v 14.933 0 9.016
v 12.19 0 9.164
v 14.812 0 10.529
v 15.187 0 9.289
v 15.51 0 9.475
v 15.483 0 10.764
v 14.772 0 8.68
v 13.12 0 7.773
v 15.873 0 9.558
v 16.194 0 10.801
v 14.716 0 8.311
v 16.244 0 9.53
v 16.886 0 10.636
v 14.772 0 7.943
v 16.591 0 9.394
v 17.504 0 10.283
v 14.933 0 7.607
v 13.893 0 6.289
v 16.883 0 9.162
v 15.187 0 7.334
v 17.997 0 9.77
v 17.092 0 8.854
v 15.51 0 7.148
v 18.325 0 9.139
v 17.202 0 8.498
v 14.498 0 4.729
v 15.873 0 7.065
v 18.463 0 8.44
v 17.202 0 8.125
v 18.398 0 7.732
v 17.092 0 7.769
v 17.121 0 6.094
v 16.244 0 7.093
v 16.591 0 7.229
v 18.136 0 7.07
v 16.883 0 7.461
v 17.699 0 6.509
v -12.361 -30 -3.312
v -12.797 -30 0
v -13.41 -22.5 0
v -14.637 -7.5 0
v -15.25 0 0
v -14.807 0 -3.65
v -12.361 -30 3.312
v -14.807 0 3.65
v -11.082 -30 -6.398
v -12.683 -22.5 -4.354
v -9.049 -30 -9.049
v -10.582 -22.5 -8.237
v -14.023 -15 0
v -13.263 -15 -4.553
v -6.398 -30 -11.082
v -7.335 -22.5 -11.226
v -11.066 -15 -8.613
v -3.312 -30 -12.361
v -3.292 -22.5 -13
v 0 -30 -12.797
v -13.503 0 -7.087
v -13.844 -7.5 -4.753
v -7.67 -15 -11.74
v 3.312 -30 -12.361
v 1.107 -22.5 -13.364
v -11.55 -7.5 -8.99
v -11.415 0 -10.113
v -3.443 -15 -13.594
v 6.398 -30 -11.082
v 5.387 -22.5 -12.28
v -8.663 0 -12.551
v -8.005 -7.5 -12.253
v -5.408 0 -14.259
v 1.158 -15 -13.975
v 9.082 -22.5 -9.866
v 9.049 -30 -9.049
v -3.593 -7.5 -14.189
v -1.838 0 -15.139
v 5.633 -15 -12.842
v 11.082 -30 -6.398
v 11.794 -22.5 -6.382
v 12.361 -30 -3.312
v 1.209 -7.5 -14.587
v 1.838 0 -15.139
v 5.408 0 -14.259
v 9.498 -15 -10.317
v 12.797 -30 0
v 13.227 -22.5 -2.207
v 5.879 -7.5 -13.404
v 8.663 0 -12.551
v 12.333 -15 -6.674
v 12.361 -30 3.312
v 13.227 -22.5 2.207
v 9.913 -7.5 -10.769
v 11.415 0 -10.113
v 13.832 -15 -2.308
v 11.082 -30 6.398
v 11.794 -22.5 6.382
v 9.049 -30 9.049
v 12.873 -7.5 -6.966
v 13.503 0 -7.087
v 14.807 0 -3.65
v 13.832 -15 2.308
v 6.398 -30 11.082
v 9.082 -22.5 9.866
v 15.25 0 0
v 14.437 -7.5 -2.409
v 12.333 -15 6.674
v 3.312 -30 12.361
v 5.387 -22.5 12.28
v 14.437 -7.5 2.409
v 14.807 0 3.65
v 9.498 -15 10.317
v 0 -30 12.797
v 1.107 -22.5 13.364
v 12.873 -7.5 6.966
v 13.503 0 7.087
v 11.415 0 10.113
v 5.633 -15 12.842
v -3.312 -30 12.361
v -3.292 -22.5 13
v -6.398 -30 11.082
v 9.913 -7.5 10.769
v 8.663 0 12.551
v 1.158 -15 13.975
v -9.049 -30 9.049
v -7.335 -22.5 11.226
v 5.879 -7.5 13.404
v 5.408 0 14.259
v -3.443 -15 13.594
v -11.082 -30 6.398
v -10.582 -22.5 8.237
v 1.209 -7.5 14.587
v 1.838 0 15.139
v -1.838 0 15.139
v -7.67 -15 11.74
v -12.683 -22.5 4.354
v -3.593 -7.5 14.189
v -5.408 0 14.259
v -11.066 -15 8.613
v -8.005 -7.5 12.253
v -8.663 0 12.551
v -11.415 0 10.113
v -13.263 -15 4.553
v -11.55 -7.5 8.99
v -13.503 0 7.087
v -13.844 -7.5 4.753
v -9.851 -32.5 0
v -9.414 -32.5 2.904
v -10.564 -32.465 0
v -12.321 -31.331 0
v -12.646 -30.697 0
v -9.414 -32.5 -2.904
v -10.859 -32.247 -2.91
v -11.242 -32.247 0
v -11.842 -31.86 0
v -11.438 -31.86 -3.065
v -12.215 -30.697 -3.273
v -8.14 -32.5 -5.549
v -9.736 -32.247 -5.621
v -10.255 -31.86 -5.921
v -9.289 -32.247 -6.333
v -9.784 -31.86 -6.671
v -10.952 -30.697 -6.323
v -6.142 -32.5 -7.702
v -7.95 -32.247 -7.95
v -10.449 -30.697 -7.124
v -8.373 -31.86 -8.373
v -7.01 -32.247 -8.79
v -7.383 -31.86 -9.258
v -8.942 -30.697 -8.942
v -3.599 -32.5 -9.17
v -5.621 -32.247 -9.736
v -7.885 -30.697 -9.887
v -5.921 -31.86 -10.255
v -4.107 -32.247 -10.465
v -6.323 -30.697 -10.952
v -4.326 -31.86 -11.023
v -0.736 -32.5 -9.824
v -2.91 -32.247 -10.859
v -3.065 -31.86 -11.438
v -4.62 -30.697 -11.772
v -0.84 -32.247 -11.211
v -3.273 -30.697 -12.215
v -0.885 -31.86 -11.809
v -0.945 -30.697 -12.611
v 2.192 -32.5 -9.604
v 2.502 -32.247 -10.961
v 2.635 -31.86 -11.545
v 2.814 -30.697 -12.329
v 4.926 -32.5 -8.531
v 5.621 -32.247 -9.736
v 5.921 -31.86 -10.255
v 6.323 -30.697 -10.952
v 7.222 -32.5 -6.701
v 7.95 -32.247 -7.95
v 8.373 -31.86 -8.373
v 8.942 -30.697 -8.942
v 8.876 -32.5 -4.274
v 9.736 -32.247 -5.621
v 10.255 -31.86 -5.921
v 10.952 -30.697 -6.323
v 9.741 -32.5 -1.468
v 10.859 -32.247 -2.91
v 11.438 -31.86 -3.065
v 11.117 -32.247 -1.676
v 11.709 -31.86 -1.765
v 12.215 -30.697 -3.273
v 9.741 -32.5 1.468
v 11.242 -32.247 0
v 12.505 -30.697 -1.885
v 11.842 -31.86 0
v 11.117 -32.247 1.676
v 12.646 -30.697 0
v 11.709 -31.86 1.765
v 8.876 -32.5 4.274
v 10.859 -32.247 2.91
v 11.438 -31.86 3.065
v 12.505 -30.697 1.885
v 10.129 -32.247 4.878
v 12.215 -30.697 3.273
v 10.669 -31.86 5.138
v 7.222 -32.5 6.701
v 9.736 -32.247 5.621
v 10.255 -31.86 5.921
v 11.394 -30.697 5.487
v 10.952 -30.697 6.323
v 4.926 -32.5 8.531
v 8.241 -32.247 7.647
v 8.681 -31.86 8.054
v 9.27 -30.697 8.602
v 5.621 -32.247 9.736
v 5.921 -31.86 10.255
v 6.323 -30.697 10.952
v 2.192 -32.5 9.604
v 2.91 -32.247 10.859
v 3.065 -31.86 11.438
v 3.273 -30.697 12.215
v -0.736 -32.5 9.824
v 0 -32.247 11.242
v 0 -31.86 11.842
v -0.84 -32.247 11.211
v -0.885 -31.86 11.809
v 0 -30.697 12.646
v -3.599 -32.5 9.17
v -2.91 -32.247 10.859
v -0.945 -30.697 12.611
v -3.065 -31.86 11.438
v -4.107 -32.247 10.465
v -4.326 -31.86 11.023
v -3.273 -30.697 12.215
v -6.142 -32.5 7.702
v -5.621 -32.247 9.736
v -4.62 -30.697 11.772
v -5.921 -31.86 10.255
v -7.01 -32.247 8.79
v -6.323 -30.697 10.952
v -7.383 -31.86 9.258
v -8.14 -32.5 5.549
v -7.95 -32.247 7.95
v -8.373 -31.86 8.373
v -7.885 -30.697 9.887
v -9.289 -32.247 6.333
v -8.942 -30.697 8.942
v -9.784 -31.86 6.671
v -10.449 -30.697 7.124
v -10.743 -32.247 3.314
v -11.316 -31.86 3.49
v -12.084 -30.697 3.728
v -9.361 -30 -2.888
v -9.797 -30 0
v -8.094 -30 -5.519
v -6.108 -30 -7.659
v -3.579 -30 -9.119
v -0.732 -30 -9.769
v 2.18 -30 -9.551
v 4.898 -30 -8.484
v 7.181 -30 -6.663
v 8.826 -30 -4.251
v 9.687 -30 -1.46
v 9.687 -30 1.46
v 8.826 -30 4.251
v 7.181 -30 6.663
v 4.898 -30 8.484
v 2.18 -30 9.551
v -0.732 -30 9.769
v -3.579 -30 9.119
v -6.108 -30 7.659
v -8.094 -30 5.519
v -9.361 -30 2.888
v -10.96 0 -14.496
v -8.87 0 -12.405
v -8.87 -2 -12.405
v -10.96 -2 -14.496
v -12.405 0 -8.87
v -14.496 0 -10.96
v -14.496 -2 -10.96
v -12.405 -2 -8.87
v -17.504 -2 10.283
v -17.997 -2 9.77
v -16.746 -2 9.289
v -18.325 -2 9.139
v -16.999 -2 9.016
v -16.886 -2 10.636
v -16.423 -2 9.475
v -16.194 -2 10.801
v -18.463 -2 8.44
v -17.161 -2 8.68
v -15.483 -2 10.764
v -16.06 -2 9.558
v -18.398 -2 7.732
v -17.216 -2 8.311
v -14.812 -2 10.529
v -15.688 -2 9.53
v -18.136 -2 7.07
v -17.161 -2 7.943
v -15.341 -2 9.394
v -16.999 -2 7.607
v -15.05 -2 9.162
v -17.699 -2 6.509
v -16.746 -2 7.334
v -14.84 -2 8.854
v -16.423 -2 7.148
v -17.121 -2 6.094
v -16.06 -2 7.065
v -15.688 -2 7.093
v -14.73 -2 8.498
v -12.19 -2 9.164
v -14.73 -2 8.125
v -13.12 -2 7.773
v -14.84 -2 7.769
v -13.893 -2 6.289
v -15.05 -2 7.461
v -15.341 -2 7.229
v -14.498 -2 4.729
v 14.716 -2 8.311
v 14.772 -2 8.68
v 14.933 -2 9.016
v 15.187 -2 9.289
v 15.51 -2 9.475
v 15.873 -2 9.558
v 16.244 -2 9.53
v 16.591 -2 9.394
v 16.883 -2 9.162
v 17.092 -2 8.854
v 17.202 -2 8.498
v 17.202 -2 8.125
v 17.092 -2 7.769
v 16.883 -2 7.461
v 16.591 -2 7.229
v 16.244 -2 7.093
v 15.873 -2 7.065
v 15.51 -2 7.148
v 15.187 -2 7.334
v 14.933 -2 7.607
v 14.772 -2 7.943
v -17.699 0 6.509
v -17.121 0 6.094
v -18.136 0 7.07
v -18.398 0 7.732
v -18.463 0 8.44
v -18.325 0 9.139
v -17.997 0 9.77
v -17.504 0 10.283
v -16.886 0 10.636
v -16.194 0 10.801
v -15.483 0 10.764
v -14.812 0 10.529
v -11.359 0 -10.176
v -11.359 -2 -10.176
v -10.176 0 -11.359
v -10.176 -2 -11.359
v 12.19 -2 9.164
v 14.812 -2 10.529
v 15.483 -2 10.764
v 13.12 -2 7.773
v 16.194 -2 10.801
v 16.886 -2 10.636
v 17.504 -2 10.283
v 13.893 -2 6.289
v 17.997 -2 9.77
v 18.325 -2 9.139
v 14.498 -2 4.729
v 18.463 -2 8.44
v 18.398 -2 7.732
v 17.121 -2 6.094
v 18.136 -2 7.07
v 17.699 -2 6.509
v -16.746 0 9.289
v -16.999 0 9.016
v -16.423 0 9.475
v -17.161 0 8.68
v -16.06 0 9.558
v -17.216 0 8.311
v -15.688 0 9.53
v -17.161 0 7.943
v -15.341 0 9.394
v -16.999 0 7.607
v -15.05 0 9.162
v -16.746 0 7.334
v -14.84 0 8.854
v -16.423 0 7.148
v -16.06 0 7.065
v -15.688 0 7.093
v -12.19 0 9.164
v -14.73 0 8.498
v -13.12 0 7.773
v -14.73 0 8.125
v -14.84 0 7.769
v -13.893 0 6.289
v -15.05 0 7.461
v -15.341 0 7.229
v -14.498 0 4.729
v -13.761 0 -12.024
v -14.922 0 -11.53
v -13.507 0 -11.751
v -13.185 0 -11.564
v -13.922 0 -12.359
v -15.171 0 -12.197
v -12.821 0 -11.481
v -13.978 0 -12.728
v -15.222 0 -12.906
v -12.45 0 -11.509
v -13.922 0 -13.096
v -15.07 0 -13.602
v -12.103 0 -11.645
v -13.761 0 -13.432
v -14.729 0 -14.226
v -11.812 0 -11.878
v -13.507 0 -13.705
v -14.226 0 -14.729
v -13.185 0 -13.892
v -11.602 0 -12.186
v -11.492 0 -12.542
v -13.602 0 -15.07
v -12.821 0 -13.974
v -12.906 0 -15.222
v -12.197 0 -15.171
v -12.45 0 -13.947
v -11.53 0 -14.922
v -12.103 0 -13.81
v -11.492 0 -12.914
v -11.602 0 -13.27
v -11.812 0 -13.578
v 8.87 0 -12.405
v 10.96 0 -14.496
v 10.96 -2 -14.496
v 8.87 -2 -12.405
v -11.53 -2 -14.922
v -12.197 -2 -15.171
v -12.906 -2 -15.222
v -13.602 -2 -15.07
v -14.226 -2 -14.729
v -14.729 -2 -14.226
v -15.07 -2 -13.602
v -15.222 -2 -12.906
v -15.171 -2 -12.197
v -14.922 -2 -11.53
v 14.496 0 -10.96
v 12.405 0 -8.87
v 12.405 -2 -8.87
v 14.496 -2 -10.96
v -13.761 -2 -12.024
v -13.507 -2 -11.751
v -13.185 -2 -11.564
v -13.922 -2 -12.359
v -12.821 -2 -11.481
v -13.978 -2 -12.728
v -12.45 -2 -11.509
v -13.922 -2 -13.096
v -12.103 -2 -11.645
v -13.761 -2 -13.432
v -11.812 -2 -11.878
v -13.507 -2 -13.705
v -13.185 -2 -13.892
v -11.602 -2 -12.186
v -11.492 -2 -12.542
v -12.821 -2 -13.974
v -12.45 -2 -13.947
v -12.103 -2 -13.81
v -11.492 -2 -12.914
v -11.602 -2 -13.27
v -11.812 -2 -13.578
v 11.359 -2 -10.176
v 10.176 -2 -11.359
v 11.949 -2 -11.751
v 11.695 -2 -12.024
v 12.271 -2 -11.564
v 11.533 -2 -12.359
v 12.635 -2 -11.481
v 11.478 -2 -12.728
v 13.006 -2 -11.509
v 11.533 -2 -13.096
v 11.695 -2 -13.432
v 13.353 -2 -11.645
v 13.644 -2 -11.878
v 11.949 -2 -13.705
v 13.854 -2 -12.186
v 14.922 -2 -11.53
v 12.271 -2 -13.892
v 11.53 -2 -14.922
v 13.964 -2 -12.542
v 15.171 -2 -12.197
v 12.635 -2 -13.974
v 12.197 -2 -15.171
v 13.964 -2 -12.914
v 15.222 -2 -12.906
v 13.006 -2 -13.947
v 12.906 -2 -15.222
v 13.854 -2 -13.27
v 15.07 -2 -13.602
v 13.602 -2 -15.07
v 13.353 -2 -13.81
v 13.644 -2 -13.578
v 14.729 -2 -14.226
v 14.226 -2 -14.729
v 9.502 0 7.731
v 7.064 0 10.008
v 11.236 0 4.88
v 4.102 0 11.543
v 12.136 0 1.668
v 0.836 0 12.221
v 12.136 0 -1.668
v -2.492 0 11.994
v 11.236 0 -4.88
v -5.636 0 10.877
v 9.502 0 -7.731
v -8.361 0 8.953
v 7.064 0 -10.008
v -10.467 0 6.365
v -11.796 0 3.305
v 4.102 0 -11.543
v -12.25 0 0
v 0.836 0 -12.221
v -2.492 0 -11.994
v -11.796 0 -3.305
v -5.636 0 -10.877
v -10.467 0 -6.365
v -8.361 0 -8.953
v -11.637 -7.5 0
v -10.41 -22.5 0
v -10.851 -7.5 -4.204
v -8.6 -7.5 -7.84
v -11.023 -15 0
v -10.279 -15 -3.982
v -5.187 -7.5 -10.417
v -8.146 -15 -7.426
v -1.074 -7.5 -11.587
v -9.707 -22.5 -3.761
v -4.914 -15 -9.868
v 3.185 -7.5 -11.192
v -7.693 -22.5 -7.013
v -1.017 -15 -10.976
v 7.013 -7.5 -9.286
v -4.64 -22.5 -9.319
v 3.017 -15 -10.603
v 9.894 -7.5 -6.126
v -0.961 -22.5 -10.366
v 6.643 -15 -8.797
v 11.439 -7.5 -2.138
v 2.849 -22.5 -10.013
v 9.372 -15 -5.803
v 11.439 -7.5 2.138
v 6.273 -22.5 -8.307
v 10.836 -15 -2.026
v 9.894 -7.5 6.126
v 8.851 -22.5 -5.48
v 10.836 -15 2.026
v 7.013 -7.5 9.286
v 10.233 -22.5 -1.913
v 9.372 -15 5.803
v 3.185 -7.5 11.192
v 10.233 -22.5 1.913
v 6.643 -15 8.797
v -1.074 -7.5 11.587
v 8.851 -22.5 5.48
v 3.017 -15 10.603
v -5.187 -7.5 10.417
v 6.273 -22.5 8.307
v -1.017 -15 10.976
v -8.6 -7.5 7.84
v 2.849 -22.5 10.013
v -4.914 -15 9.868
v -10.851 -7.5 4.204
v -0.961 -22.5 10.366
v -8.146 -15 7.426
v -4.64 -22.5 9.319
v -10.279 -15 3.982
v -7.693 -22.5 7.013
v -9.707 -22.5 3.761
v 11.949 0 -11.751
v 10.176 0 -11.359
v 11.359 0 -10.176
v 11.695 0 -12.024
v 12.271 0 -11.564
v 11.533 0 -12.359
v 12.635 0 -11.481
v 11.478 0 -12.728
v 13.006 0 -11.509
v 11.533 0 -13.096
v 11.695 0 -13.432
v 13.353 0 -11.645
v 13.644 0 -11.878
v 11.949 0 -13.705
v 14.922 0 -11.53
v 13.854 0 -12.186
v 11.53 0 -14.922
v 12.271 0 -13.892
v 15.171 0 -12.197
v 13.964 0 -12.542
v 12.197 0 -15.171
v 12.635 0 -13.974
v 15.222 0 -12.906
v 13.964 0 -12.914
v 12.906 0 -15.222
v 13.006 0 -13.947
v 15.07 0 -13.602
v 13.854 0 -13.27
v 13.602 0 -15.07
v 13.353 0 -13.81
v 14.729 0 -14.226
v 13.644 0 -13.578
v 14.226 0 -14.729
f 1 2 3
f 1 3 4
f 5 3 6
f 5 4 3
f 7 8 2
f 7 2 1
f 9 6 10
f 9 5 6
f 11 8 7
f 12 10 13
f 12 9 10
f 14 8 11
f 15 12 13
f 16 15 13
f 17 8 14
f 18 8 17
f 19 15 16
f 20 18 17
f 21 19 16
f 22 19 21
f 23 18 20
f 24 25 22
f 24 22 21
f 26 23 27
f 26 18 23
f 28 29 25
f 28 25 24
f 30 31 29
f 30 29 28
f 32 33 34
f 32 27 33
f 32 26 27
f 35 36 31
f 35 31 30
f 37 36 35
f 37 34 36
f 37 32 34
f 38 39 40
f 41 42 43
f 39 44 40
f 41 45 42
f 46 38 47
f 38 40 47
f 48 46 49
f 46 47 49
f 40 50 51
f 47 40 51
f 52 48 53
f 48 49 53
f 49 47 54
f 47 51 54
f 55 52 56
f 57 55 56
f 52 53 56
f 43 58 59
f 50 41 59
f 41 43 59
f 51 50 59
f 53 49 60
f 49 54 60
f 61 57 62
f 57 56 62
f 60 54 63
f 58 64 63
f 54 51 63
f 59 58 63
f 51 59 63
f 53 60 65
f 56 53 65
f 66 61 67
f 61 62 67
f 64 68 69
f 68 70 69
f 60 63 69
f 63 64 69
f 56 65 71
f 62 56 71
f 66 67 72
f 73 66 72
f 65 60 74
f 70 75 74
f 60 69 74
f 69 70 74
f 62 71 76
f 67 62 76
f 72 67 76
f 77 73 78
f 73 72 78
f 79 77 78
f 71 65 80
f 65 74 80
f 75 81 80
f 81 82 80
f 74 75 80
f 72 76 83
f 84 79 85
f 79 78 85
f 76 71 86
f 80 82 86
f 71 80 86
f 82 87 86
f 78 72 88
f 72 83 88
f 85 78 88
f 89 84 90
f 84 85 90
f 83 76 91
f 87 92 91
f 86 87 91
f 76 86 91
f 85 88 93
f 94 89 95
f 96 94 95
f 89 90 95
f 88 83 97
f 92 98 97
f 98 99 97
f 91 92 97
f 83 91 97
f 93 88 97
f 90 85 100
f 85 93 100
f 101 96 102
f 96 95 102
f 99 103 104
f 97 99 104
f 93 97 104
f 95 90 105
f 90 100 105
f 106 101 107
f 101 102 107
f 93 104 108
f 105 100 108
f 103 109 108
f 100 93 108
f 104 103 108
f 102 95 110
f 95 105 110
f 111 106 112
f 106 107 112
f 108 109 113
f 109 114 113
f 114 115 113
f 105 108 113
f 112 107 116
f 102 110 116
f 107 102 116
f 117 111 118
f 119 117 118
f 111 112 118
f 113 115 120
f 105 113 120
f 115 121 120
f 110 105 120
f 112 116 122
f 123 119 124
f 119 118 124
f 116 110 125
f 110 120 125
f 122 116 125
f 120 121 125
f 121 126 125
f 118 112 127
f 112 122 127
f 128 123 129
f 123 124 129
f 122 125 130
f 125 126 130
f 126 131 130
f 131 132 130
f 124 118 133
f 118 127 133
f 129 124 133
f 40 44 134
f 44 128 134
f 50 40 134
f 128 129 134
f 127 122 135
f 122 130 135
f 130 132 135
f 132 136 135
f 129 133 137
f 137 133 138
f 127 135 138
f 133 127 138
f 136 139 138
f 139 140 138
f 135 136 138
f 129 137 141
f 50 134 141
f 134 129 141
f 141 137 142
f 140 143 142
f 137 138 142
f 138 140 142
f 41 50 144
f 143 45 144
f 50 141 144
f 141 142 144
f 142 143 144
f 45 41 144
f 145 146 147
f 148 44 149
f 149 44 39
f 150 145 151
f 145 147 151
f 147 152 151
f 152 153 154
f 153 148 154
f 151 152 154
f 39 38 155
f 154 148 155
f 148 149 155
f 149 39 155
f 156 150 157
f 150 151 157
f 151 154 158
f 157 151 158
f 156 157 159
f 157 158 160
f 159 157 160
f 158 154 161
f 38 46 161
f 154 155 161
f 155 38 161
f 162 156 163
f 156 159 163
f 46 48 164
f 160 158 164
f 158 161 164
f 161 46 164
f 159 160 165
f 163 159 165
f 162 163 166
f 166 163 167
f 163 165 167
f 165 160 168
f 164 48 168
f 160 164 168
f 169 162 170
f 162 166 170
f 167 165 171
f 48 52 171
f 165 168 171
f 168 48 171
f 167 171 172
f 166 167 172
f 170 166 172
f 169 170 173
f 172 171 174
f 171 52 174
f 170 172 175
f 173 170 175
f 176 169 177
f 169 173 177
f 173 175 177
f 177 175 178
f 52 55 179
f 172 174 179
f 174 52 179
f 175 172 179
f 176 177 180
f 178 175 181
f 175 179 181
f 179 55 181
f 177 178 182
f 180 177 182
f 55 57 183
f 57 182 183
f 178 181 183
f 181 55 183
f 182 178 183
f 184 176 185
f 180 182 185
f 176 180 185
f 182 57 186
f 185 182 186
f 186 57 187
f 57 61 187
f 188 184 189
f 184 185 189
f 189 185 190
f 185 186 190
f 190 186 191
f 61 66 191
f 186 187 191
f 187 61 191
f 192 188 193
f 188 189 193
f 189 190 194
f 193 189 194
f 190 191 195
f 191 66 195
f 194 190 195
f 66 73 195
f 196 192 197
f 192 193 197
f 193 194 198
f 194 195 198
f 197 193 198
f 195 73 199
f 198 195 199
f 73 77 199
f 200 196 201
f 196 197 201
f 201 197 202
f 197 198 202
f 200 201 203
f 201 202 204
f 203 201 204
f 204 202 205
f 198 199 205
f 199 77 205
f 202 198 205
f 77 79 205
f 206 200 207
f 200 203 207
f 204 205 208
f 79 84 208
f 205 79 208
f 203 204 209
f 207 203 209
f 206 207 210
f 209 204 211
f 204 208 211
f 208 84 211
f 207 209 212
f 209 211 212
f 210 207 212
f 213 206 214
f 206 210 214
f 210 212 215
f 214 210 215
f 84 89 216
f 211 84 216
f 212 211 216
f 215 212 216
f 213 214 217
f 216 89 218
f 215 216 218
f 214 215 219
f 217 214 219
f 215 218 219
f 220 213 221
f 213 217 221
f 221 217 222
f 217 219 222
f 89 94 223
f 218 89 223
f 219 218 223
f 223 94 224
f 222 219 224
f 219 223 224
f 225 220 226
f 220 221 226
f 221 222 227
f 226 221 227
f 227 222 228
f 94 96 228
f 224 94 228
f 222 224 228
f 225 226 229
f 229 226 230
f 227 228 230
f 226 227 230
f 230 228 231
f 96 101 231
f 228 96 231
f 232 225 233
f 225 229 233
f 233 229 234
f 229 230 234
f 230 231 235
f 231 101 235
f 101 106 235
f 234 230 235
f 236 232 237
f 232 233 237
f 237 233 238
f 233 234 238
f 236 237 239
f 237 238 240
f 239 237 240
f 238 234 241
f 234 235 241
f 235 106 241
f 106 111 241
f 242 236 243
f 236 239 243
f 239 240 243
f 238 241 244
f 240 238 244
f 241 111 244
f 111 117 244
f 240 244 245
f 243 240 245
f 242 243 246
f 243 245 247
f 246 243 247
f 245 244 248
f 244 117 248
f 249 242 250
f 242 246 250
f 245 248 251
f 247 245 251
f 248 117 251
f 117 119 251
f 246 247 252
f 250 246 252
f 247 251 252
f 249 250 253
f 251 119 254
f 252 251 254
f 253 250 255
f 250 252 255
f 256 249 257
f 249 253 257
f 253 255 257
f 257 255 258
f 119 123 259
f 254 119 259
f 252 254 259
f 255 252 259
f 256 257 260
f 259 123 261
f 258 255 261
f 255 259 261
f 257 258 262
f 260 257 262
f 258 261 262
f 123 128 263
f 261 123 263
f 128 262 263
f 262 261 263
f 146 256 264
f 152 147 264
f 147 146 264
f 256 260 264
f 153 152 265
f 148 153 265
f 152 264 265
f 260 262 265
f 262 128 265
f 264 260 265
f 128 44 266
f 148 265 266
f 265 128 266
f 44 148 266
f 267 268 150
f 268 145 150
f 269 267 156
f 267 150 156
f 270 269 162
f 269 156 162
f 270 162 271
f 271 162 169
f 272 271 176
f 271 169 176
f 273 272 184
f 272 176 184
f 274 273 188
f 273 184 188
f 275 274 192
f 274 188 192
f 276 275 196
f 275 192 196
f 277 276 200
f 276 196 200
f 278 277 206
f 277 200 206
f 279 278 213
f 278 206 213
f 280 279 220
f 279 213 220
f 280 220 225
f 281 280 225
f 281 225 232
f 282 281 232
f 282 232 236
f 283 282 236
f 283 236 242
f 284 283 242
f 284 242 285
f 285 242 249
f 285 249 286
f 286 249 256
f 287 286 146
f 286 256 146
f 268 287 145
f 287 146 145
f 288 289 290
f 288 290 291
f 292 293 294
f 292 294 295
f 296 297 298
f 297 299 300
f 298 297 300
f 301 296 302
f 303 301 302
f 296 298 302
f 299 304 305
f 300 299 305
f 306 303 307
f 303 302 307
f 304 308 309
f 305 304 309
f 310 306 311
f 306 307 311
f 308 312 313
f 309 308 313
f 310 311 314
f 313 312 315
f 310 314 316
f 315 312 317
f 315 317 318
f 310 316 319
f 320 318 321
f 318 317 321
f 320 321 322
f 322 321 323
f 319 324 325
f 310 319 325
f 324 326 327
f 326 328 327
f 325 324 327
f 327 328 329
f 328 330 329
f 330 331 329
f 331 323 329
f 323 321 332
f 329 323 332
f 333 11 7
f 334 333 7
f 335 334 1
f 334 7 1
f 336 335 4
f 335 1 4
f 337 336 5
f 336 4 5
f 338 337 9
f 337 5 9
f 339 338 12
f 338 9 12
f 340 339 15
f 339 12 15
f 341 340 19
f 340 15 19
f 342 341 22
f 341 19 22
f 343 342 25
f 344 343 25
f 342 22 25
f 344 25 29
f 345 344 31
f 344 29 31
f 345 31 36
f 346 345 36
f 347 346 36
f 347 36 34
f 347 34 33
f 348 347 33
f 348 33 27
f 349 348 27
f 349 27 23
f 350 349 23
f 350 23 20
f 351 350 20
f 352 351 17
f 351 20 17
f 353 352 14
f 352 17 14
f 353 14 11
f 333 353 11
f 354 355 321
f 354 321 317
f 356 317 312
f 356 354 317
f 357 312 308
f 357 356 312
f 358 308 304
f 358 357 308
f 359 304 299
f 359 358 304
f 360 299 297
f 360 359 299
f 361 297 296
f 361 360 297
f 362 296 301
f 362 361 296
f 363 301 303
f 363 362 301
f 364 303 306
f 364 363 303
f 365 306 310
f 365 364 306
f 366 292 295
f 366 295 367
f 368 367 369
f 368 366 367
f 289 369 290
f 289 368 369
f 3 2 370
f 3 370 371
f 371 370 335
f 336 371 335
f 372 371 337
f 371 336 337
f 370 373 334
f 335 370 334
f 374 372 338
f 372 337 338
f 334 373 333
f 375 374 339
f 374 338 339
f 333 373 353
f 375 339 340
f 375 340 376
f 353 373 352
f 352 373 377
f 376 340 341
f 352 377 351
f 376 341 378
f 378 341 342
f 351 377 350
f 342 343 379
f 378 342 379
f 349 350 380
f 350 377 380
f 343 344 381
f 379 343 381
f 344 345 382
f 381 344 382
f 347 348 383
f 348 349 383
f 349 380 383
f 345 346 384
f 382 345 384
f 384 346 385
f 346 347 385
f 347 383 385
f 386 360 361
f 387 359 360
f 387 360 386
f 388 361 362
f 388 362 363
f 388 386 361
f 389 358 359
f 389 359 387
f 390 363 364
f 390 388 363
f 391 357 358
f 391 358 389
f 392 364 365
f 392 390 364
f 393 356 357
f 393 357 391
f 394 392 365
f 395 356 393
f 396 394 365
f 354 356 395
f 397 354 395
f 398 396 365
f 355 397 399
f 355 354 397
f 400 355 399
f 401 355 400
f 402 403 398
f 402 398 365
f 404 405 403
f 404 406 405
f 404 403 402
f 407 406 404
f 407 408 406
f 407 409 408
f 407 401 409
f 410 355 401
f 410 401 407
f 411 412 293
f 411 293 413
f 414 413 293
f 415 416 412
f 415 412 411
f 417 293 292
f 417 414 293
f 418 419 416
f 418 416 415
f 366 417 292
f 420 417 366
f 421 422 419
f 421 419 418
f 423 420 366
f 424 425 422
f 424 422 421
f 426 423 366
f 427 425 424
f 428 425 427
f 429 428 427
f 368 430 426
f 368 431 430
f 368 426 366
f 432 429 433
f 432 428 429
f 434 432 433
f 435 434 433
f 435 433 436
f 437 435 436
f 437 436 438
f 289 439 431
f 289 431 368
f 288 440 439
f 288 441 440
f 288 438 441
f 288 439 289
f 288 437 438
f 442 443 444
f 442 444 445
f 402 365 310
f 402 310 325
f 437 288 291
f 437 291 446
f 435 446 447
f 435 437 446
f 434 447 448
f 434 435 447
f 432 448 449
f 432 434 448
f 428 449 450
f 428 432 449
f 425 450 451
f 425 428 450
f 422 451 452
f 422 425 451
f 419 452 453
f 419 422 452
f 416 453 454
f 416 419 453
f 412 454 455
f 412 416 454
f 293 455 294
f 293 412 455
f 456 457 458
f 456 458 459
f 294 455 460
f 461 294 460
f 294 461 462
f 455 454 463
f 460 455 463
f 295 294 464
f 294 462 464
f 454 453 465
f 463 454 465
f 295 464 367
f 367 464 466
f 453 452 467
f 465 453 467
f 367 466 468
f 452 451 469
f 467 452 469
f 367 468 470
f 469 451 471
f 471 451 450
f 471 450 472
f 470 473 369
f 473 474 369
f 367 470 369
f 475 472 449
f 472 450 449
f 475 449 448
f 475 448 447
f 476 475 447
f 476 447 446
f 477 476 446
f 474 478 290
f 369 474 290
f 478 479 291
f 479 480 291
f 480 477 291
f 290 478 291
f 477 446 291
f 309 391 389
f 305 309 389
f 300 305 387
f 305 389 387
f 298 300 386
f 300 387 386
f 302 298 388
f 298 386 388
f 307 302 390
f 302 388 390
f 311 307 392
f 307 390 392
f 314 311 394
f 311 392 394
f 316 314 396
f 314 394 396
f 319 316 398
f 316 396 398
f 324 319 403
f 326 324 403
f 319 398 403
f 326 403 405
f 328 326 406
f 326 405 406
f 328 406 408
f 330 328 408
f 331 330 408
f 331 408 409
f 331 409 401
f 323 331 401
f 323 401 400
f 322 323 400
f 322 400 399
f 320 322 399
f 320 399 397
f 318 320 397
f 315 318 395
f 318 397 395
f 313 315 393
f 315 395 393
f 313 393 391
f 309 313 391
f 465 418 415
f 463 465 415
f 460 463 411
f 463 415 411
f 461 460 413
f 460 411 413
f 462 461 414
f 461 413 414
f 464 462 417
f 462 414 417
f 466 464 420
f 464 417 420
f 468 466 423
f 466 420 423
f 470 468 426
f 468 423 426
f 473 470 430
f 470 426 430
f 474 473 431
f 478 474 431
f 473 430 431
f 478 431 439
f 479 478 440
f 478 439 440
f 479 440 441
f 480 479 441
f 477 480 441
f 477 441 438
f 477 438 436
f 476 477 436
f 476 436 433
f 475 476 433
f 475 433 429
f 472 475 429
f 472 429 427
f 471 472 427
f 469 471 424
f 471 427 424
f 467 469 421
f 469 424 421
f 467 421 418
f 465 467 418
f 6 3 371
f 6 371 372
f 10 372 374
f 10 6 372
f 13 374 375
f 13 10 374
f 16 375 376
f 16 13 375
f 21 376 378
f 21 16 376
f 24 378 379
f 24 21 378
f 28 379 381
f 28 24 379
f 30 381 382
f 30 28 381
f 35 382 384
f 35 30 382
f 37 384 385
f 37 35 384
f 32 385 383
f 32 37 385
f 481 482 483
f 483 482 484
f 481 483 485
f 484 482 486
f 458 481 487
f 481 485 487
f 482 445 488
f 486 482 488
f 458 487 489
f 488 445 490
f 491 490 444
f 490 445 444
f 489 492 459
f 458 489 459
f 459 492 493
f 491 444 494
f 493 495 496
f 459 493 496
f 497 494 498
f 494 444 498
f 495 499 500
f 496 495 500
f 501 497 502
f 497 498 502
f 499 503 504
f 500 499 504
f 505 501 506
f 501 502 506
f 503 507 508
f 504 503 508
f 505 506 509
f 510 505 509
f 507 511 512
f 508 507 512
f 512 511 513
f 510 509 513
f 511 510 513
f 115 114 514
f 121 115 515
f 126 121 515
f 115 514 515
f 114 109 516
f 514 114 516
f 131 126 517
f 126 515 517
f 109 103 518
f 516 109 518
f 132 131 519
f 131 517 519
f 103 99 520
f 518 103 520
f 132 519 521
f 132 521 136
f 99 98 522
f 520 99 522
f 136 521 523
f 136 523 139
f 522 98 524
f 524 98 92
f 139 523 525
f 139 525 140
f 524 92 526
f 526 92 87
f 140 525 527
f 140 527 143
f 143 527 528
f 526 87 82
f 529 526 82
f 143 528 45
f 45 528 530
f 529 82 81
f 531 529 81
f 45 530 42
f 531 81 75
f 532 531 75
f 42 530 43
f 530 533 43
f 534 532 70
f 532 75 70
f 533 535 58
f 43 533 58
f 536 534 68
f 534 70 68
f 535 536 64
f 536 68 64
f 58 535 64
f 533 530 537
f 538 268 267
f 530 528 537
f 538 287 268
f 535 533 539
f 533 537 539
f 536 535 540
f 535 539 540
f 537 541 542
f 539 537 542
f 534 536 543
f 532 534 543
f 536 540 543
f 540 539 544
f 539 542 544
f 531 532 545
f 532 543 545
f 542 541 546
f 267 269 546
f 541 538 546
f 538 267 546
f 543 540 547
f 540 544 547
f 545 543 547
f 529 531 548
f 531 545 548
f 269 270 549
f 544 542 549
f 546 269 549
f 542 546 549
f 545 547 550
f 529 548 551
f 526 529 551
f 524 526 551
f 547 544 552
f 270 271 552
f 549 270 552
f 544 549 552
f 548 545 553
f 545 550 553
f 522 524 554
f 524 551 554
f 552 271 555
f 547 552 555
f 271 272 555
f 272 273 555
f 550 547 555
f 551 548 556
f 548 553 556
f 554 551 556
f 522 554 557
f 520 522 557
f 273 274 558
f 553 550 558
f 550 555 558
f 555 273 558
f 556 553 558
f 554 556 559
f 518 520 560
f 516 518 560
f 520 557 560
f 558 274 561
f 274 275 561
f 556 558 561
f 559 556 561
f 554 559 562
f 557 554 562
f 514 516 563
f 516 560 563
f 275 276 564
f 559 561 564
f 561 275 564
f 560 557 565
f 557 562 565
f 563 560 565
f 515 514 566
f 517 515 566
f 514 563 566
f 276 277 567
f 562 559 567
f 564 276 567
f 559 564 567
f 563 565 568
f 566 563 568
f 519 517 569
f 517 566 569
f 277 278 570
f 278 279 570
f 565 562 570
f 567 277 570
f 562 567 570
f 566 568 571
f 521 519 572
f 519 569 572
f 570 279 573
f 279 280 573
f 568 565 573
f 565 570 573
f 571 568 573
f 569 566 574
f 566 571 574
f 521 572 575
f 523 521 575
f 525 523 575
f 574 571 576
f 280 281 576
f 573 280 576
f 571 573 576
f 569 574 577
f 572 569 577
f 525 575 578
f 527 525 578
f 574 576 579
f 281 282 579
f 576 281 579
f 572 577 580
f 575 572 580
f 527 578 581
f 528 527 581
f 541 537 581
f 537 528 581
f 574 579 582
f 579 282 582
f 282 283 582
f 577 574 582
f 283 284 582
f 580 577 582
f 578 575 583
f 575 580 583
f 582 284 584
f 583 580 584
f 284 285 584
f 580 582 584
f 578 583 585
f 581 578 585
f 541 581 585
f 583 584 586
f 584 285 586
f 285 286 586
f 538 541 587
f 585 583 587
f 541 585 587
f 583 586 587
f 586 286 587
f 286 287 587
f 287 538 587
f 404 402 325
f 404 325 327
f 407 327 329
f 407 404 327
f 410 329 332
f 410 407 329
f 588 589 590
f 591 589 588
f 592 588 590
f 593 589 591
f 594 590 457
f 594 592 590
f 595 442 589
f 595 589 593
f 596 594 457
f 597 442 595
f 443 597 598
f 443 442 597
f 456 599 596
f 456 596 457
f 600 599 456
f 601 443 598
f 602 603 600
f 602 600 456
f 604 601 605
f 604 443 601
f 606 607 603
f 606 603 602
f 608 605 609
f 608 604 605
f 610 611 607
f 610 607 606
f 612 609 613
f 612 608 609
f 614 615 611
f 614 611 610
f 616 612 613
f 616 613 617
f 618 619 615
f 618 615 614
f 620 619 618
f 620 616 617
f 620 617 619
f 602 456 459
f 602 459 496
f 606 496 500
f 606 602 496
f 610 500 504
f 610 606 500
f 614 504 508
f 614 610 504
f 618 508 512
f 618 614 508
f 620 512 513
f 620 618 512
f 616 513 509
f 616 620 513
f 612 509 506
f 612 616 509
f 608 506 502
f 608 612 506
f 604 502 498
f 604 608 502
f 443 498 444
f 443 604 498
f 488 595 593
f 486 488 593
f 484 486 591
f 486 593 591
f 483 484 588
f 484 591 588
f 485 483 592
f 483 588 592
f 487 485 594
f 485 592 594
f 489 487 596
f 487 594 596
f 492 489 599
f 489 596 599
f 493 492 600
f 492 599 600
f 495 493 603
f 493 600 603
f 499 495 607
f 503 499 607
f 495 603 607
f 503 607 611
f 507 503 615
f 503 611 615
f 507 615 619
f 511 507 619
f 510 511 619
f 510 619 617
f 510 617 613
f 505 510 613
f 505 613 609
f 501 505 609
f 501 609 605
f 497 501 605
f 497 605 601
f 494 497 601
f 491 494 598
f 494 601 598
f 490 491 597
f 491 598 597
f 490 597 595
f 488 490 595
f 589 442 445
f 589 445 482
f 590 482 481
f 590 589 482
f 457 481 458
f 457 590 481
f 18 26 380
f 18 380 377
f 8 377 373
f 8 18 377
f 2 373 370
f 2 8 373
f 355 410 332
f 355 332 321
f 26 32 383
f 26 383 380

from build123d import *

# Parameters (mm, degrees)
CROQUIS3_R                = 1.25
SALIENTE_EXTRUIR1_DEPTH   = 2
SALIENTE_EXTRUIR1_2_DEPTH = 2
SALIENTE_EXTRUIR1_3_DEPTH = 2
SALIENTE_EXTRUIR1_4_DEPTH = 2


with BuildPart() as part:
    # Croquis2 → Revolución1 (revolve)
    with BuildSketch(Plane.XY, mode=Mode.PRIVATE) as revoluci_n1_sk:
        with BuildLine():
            Line((15.25, 0), (12.25, 0))
            Line((12.25, 0), (9.796635433, -30))
            Line((9.796635433, -30), (9.851324322, -32.5))
            ThreePointArc((9.851324322, -32.5), (11.841746831, -31.859993904), (12.796635433, -30))
            Line((12.796635433, -30), (15.25, 0))
        make_face()
    revolve(revoluci_n1_sk.sketch.rotate(Axis((0, 0, 0), (0, -1, 0)), 180), axis=Axis((0, 0, 0), (0, -1, 0)))


with BuildPart() as body_2:
    # Croquis3 → Saliente-Extruir1 (new body)
    with BuildSketch(Plane(origin=(0, 0, 0), x_dir=(1, 0, 0), z_dir=(0, 1, 0))):
        with BuildLine():
            ThreePointArc((14.495689014, 10.960155108), (14.495689014, 14.495689014), (10.960155108, 14.495689014))
            Line((10.960155108, 14.495689014), (8.869725703, 12.405259609))
            ThreePointArc((8.869725703, 12.405259609), (10.783378413, 10.783378413), (12.405259609, 8.869725703))
            Line((12.405259609, 8.869725703), (14.495689014, 10.960155108))
        make_face()
        with Locations(Location((12.727922061, 12.727922061, 0), (0, 0, 180))):
            Circle(CROQUIS3_R, mode=Mode.SUBTRACT)
    extrude(amount=-SALIENTE_EXTRUIR1_DEPTH)


with BuildPart() as body_3:
    # Croquis3 → Saliente-Extruir1 2 (new body)
    with BuildSketch(Plane(origin=(0, 0, 0), x_dir=(1, 0, 0), z_dir=(0, 1, 0))):
        with BuildLine():
            ThreePointArc((-12.405259609, 8.869725703), (-10.783378413, 10.783378413), (-8.869725703, 12.405259609))
            Line((-8.869725703, 12.405259609), (-10.960155108, 14.495689014))
            ThreePointArc((-10.960155108, 14.495689014), (-14.495689014, 14.495689014), (-14.495689014, 10.960155108))
            Line((-14.495689014, 10.960155108), (-12.405259609, 8.869725703))
        make_face()
        with Locations(Location((-12.727922061, 12.727922061, 0), (0, 0, 180))):
            Circle(CROQUIS3_R, mode=Mode.SUBTRACT)
    extrude(amount=-SALIENTE_EXTRUIR1_2_DEPTH)


with BuildPart() as body_4:
    # Croquis3 → Saliente-Extruir1 3 (new body)
    with BuildSketch(Plane(origin=(0, 0, 0), x_dir=(1, 0, 0), z_dir=(0, 1, 0))):
        with BuildLine():
            ThreePointArc((-12.18954126, -9.163928408), (-13.526915206, -7.041666352), (-14.498284326, -4.728874243))
            Line((-14.498284326, -4.728874243), (-17.12056653, -6.093947955))
            ThreePointArc((-17.12056653, -6.093947955), (-18.18372208, -9.465846571), (-14.811823464, -10.529002121))
            Line((-14.811823464, -10.529002121), (-12.18954126, -9.163928408))
        make_face()
        with Locations(Location((-15.966194997, -8.311475038, 0), (0, 0, 180))):
            Circle(CROQUIS3_R, mode=Mode.SUBTRACT)
    extrude(amount=-SALIENTE_EXTRUIR1_3_DEPTH)


with BuildPart() as body_5:
    # Croquis3 → Saliente-Extruir1 4 (new body)
    with BuildSketch(Plane(origin=(0, 0, 0), x_dir=(1, 0, 0), z_dir=(0, 1, 0))):
        with BuildLine():
            Line((17.12056653, -6.093947955), (14.498284326, -4.728874243))
            ThreePointArc((14.498284326, -4.728874243), (13.526915206, -7.041666352), (12.18954126, -9.163928408))
            Line((12.18954126, -9.163928408), (14.811823464, -10.529002121))
            ThreePointArc((14.811823464, -10.529002121), (18.18372208, -9.465846571), (17.12056653, -6.093947955))
        make_face()
        with Locations(Location((15.966194997, -8.311475038, 0), (0, 0, 180))):
            Circle(CROQUIS3_R, mode=Mode.SUBTRACT)
    extrude(amount=-SALIENTE_EXTRUIR1_4_DEPTH)


solid = Compound([part.part, body_2.part, body_3.part, body_4.part, body_5.part])
